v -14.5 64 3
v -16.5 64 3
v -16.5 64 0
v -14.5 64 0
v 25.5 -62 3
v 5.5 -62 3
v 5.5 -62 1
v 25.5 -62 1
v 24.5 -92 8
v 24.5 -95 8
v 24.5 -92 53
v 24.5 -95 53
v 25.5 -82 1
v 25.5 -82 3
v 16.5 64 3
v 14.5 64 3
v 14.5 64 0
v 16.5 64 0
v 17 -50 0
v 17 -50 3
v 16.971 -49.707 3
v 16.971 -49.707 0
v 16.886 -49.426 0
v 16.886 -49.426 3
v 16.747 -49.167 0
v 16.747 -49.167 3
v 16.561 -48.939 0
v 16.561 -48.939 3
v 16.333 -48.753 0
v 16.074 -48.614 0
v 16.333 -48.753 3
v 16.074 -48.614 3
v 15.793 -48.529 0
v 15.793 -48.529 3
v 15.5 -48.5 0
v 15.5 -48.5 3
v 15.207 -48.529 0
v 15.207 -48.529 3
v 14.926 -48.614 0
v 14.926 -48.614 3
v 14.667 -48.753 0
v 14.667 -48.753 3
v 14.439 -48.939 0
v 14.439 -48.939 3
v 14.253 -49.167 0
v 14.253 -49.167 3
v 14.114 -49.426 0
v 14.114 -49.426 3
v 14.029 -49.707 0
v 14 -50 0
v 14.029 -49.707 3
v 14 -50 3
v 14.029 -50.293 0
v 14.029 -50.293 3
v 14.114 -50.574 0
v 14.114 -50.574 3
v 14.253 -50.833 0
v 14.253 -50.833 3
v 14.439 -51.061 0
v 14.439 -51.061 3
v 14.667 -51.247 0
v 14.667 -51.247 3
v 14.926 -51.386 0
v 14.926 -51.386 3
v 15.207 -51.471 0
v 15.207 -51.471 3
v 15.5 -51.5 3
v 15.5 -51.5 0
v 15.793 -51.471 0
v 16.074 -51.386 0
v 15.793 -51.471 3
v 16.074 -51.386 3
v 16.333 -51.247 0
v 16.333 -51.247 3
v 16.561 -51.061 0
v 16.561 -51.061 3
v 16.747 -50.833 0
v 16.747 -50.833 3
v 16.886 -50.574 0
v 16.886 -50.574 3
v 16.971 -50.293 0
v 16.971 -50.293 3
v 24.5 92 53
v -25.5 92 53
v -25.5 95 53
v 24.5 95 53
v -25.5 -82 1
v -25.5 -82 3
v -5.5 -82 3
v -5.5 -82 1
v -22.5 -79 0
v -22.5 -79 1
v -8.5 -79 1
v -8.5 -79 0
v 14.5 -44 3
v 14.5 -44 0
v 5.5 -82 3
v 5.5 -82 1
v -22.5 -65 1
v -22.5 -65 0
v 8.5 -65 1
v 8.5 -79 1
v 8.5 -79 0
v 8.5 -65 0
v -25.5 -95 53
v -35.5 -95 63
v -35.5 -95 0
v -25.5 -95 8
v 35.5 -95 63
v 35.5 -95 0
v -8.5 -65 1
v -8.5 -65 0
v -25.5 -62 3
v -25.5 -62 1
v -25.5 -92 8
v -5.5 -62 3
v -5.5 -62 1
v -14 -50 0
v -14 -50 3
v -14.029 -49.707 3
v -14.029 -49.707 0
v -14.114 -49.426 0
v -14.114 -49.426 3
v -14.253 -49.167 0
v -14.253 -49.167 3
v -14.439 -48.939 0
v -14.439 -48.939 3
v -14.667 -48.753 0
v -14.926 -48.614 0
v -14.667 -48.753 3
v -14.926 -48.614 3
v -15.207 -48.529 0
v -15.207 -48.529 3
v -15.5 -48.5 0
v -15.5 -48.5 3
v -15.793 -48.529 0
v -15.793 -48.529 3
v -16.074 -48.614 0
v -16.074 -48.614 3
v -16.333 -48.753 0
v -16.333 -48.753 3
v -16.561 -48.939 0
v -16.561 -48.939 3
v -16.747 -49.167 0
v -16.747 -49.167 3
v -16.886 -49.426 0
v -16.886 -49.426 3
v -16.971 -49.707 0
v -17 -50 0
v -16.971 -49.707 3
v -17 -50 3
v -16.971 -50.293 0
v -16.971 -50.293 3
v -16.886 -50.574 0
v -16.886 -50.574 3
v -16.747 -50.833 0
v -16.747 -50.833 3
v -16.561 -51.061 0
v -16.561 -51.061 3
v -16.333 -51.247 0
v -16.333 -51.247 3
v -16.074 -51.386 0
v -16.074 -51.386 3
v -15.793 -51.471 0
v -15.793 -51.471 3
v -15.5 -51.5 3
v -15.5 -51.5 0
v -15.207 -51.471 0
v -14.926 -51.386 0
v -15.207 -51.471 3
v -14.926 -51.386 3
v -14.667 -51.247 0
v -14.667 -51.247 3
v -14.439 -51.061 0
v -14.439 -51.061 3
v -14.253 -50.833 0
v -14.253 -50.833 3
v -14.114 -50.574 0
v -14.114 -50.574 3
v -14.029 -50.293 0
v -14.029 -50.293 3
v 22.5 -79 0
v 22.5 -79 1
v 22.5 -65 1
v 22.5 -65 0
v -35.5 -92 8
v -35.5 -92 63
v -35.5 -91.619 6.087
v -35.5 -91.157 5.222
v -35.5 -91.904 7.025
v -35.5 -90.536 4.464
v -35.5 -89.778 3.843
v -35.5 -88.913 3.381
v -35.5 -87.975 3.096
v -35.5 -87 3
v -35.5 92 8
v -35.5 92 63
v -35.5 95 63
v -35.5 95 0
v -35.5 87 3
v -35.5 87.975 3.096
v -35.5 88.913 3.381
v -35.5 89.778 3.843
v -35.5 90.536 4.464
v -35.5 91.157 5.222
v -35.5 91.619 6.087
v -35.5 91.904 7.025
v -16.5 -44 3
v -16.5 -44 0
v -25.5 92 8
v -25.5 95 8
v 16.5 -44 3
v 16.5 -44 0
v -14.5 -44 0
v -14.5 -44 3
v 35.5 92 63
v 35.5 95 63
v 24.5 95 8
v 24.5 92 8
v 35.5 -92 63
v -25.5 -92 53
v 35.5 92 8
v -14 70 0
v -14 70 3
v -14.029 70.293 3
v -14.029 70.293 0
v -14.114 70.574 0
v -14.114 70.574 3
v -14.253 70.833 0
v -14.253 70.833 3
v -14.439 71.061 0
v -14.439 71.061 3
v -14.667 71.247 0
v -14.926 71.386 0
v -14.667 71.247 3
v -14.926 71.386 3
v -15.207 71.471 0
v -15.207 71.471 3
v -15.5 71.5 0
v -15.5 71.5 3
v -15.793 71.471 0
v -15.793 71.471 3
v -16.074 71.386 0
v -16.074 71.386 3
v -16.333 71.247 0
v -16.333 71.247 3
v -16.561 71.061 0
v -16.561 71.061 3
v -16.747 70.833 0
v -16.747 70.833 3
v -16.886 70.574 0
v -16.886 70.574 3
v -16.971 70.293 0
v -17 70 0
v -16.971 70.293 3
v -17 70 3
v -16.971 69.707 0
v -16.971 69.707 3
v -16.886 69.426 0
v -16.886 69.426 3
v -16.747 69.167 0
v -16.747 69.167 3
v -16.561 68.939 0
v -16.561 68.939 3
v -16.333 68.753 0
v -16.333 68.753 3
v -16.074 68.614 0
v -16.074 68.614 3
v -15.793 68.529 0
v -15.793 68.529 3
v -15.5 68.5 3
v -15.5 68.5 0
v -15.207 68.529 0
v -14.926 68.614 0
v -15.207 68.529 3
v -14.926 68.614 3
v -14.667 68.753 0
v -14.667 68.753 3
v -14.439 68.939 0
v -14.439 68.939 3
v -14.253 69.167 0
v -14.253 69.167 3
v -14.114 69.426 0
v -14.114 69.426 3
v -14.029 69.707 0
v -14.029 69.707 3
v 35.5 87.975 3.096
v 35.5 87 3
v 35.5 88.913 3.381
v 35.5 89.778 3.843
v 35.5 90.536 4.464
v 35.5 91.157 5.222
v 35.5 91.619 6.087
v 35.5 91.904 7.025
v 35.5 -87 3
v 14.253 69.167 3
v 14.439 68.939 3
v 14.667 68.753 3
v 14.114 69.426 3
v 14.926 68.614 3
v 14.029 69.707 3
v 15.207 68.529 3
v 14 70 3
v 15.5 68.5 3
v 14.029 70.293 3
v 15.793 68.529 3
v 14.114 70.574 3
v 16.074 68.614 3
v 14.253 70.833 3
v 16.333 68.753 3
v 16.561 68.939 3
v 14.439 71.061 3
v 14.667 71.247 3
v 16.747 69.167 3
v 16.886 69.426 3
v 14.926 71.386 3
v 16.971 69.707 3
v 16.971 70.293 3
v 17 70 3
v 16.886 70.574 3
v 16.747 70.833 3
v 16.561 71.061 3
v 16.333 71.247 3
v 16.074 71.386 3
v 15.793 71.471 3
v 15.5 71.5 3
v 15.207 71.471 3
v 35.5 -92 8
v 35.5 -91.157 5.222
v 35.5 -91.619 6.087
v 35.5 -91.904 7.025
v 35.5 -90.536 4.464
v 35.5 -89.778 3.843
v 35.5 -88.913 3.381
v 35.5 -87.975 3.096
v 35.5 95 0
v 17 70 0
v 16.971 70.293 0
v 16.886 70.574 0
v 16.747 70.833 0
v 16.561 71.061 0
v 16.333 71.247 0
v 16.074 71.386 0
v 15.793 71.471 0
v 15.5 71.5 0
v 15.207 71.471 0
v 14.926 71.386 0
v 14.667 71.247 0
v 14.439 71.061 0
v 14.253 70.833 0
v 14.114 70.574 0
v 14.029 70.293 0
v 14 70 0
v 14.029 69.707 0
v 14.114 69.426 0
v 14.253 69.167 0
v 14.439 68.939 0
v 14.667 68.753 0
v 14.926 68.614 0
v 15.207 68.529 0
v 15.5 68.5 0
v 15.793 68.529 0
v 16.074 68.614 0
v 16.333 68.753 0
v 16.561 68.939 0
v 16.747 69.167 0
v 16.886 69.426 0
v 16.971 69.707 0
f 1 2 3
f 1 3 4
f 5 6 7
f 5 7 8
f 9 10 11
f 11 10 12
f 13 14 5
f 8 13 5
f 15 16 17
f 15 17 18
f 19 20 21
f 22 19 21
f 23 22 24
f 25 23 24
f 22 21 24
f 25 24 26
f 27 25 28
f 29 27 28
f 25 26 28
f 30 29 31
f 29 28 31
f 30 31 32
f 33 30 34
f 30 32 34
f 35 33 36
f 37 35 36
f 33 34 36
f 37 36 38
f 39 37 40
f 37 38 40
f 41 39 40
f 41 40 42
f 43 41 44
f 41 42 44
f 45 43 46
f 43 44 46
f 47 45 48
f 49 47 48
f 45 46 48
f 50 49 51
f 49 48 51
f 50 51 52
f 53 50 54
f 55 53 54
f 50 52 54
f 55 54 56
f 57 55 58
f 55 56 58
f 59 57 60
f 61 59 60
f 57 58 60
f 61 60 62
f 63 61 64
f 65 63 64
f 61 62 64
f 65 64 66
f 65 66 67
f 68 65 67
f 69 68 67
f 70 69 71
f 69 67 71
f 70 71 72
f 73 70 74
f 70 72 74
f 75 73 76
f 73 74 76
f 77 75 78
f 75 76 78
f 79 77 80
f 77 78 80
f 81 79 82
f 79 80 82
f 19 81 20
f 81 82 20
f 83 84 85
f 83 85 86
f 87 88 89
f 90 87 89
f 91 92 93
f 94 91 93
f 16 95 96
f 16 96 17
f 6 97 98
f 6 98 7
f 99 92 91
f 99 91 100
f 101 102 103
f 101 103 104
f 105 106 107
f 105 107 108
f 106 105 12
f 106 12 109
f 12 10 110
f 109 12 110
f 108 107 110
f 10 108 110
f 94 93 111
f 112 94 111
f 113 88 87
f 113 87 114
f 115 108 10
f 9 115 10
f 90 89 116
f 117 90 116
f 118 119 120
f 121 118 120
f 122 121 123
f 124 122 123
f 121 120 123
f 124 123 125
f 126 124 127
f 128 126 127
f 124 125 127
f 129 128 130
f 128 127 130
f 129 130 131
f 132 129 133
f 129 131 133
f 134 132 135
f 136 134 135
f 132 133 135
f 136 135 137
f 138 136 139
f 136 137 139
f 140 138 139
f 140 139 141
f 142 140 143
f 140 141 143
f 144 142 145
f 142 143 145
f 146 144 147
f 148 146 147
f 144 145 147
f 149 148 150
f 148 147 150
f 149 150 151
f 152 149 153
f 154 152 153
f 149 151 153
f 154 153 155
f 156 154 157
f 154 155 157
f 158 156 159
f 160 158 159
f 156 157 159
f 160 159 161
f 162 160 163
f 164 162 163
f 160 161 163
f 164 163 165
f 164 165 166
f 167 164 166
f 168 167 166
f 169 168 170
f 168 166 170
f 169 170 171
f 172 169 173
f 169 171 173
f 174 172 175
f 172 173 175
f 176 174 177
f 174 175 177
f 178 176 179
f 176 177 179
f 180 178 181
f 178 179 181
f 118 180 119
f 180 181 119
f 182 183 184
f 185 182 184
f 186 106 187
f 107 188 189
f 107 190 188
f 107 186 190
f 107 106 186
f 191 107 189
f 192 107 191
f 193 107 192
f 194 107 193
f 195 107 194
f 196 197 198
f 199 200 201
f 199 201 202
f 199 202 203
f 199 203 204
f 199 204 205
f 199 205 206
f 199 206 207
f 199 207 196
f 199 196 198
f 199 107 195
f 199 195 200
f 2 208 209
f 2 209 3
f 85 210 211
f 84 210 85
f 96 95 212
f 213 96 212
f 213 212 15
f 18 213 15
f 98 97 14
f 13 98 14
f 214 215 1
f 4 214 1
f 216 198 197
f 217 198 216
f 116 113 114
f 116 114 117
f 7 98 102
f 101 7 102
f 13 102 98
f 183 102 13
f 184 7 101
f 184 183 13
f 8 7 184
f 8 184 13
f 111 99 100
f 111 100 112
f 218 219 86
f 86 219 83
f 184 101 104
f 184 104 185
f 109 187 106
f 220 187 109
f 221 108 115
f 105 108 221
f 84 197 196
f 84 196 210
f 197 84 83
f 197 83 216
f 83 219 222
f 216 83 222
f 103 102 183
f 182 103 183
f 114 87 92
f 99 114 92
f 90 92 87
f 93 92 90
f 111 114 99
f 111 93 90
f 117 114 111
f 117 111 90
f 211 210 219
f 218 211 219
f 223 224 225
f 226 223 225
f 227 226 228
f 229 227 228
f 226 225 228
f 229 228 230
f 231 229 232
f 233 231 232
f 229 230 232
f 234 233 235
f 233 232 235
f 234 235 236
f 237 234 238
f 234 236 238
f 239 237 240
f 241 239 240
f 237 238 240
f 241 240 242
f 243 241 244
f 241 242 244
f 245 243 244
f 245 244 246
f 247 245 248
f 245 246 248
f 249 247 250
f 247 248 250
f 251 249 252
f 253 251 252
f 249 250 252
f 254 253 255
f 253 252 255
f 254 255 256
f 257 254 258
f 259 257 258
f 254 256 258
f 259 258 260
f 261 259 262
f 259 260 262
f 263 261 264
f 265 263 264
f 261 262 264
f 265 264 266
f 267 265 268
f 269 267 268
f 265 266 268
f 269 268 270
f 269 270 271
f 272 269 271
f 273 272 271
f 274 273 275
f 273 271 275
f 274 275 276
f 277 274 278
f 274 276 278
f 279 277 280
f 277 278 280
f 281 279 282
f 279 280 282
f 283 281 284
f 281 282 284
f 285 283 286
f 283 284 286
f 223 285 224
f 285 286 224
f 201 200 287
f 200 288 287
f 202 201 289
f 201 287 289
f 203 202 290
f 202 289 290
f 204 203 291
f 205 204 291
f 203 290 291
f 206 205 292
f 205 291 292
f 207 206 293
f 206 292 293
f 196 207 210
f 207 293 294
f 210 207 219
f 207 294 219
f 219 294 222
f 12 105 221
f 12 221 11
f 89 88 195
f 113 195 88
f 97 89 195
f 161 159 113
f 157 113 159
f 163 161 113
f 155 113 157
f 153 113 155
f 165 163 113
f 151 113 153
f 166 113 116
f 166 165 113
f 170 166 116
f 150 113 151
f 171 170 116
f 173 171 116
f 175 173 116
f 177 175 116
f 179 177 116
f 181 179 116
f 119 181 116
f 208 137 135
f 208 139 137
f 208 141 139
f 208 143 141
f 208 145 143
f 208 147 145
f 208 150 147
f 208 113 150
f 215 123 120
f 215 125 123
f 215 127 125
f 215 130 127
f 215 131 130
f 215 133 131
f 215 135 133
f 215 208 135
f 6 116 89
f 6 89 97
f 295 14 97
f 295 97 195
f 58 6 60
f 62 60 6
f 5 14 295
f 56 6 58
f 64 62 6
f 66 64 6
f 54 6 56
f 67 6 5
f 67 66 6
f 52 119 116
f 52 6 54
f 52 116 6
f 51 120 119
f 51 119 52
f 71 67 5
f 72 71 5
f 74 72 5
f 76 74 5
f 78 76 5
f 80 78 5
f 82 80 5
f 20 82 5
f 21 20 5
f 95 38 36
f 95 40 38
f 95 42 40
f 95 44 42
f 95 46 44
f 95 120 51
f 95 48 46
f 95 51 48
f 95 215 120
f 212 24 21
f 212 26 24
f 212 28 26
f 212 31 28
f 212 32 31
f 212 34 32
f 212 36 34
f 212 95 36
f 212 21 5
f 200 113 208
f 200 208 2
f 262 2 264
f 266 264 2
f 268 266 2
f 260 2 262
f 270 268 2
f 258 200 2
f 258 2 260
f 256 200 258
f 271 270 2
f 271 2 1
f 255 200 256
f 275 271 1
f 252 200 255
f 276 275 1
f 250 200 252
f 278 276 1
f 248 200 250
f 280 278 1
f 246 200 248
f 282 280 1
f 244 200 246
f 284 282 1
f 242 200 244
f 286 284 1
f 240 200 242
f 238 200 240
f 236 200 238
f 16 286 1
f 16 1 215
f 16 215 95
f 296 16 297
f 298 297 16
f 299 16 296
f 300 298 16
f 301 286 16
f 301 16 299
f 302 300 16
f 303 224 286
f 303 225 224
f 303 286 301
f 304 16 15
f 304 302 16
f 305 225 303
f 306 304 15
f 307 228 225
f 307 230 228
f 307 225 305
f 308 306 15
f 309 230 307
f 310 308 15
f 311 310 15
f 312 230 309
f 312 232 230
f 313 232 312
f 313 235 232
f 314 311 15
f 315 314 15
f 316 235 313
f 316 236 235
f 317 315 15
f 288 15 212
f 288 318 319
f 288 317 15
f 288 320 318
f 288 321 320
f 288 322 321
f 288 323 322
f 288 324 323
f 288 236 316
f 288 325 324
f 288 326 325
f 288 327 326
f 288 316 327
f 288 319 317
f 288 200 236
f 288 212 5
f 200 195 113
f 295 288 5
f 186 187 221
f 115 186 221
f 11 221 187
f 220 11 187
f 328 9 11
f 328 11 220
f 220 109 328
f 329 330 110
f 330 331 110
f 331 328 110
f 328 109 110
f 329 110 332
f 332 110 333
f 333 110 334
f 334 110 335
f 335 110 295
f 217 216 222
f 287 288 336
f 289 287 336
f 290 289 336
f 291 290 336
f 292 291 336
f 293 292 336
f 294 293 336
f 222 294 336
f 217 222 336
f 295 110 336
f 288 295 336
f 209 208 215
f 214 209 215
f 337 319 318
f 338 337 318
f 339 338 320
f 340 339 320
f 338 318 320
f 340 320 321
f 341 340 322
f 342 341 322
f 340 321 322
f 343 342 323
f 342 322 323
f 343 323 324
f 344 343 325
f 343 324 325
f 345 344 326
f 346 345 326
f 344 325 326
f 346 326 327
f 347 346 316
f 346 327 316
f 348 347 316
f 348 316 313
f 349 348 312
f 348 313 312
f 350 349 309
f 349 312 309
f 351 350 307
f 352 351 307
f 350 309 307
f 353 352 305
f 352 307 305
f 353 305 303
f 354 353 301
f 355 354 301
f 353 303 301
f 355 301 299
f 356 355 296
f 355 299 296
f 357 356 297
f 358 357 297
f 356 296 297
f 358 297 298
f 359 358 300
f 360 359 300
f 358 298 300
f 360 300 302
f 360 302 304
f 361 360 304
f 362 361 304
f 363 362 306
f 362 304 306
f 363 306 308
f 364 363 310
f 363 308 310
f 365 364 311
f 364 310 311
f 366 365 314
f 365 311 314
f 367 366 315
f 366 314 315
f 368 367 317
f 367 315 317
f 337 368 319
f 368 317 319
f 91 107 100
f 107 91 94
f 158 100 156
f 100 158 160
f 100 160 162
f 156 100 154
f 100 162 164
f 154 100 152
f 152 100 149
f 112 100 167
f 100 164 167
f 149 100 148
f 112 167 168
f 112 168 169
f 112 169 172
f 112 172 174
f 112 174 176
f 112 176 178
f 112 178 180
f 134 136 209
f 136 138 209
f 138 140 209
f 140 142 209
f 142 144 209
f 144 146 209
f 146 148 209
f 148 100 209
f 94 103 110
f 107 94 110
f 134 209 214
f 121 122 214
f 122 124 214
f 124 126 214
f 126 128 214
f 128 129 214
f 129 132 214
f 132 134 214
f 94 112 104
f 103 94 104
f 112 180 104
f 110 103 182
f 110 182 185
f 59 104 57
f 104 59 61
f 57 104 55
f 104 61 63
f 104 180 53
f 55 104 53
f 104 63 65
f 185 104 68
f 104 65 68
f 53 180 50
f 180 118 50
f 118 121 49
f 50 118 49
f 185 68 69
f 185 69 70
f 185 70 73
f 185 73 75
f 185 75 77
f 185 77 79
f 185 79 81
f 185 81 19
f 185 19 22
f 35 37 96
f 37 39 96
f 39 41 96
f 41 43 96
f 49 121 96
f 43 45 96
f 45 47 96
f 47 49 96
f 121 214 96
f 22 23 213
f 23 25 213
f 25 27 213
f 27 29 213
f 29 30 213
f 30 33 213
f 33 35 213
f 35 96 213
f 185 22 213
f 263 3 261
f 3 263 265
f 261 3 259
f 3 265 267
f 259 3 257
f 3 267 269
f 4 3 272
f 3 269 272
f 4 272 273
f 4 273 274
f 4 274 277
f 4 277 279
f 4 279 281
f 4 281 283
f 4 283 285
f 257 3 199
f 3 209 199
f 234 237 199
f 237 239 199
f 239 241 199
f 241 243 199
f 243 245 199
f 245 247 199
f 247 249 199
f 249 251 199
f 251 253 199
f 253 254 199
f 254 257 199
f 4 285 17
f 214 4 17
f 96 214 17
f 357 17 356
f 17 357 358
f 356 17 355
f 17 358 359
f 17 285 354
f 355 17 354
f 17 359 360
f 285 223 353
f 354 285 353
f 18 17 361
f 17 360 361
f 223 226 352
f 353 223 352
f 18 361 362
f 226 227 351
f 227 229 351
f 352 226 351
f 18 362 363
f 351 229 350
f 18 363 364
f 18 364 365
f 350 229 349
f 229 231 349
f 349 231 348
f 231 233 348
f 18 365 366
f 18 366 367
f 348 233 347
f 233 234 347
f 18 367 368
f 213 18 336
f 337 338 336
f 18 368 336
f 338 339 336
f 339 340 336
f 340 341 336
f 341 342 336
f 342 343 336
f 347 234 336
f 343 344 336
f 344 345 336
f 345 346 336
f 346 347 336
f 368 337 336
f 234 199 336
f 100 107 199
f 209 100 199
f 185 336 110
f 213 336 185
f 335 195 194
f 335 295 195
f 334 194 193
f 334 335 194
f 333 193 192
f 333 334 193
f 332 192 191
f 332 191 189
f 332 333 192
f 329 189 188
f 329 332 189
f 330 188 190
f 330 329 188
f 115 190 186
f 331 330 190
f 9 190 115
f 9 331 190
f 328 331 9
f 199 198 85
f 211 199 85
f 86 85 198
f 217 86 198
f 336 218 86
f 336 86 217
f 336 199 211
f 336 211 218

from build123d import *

# Parameters (mm, degrees)
SKETCH_W        = 71
SKETCH_H        = 190
PAD_DEPTH       = 3
SKETCH001_R     = 1.5
SKETCH001_W     = 14
SKETCH001_H     = 14
SKETCH001_W_2   = 2
SKETCH001_H_2   = 108
POCKET_DEPTH    = 3
SKETCH002_W     = 71
SKETCH002_H     = 3
PAD001_DEPTH    = 60
FILLET_R        = 5
SKETCH003_W     = 20
SKETCH003_H     = 20
POCKET001_DEPTH = 2
SKETCH004_W     = 50
SKETCH004_H     = 45
POCKET002_DEPTH = 200


with BuildPart() as part:
    # Sketch → Pad (new body)
    with BuildSketch(Plane.XY):
        Rectangle(SKETCH_W, SKETCH_H)
    extrude(amount=PAD_DEPTH)

    # Sketch001 (on Face6 of Pad) → Pocket (cut)
    with BuildSketch(Plane.XY.offset(3)):
        with Locations((-15.5, 70)):
            Circle(SKETCH001_R)
        with Locations((-15.5, -50)):
            Circle(SKETCH001_R)
        with Locations((15.5, 70)):
            Circle(SKETCH001_R)
        with Locations((15.5, -50)):
            Circle(SKETCH001_R)
        with Locations((-15.5, -72)):
            Rectangle(SKETCH001_W, SKETCH001_H)
        with Locations((-15.5, 10)):
            Rectangle(SKETCH001_W_2, SKETCH001_H_2)
        with Locations((15.5, -72)):
            Rectangle(SKETCH001_W, SKETCH001_H)
        with Locations((15.5, 10)):
            Rectangle(SKETCH001_W_2, SKETCH001_H_2)
    extrude(amount=-POCKET_DEPTH, mode=Mode.SUBTRACT)

    # Sketch002 (on Face5 of Pocket) → Pad001 (join)
    with BuildSketch(Plane.XY.offset(3)):
        with Locations((0, 93.5)):
            Rectangle(SKETCH002_W, SKETCH002_H)
        with Locations((0, -93.5)):
            Rectangle(SKETCH002_W, SKETCH002_H)
    extrude(amount=PAD001_DEPTH)

    # Fillet
    fillet_edges = [part.edges().sort_by_distance(p)[0] for p in [
        (0, 92, 3),
        (0, -92, 3),
    ]]
    fillet(fillet_edges, radius=FILLET_R)

    # Sketch003 (on Face2 of Fillet) → Pocket001 (cut)
    with BuildSketch(Plane.XY.offset(3)):
        with Locations((-15.5, -72)):
            Rectangle(SKETCH003_W, SKETCH003_H)
        with Locations((15.5, -72)):
            Rectangle(SKETCH003_W, SKETCH003_H)
    extrude(amount=-POCKET001_DEPTH, mode=Mode.SUBTRACT)

    # Sketch004 (on Face33 of Pocket001) → Pocket002 (cut)
    with BuildSketch(Plane.XZ.offset(95)):
        with Locations((-0.5, 30.5)):
            Rectangle(SKETCH004_W, SKETCH004_H)
    extrude(amount=-POCKET002_DEPTH, mode=Mode.SUBTRACT)


solid = part.part
